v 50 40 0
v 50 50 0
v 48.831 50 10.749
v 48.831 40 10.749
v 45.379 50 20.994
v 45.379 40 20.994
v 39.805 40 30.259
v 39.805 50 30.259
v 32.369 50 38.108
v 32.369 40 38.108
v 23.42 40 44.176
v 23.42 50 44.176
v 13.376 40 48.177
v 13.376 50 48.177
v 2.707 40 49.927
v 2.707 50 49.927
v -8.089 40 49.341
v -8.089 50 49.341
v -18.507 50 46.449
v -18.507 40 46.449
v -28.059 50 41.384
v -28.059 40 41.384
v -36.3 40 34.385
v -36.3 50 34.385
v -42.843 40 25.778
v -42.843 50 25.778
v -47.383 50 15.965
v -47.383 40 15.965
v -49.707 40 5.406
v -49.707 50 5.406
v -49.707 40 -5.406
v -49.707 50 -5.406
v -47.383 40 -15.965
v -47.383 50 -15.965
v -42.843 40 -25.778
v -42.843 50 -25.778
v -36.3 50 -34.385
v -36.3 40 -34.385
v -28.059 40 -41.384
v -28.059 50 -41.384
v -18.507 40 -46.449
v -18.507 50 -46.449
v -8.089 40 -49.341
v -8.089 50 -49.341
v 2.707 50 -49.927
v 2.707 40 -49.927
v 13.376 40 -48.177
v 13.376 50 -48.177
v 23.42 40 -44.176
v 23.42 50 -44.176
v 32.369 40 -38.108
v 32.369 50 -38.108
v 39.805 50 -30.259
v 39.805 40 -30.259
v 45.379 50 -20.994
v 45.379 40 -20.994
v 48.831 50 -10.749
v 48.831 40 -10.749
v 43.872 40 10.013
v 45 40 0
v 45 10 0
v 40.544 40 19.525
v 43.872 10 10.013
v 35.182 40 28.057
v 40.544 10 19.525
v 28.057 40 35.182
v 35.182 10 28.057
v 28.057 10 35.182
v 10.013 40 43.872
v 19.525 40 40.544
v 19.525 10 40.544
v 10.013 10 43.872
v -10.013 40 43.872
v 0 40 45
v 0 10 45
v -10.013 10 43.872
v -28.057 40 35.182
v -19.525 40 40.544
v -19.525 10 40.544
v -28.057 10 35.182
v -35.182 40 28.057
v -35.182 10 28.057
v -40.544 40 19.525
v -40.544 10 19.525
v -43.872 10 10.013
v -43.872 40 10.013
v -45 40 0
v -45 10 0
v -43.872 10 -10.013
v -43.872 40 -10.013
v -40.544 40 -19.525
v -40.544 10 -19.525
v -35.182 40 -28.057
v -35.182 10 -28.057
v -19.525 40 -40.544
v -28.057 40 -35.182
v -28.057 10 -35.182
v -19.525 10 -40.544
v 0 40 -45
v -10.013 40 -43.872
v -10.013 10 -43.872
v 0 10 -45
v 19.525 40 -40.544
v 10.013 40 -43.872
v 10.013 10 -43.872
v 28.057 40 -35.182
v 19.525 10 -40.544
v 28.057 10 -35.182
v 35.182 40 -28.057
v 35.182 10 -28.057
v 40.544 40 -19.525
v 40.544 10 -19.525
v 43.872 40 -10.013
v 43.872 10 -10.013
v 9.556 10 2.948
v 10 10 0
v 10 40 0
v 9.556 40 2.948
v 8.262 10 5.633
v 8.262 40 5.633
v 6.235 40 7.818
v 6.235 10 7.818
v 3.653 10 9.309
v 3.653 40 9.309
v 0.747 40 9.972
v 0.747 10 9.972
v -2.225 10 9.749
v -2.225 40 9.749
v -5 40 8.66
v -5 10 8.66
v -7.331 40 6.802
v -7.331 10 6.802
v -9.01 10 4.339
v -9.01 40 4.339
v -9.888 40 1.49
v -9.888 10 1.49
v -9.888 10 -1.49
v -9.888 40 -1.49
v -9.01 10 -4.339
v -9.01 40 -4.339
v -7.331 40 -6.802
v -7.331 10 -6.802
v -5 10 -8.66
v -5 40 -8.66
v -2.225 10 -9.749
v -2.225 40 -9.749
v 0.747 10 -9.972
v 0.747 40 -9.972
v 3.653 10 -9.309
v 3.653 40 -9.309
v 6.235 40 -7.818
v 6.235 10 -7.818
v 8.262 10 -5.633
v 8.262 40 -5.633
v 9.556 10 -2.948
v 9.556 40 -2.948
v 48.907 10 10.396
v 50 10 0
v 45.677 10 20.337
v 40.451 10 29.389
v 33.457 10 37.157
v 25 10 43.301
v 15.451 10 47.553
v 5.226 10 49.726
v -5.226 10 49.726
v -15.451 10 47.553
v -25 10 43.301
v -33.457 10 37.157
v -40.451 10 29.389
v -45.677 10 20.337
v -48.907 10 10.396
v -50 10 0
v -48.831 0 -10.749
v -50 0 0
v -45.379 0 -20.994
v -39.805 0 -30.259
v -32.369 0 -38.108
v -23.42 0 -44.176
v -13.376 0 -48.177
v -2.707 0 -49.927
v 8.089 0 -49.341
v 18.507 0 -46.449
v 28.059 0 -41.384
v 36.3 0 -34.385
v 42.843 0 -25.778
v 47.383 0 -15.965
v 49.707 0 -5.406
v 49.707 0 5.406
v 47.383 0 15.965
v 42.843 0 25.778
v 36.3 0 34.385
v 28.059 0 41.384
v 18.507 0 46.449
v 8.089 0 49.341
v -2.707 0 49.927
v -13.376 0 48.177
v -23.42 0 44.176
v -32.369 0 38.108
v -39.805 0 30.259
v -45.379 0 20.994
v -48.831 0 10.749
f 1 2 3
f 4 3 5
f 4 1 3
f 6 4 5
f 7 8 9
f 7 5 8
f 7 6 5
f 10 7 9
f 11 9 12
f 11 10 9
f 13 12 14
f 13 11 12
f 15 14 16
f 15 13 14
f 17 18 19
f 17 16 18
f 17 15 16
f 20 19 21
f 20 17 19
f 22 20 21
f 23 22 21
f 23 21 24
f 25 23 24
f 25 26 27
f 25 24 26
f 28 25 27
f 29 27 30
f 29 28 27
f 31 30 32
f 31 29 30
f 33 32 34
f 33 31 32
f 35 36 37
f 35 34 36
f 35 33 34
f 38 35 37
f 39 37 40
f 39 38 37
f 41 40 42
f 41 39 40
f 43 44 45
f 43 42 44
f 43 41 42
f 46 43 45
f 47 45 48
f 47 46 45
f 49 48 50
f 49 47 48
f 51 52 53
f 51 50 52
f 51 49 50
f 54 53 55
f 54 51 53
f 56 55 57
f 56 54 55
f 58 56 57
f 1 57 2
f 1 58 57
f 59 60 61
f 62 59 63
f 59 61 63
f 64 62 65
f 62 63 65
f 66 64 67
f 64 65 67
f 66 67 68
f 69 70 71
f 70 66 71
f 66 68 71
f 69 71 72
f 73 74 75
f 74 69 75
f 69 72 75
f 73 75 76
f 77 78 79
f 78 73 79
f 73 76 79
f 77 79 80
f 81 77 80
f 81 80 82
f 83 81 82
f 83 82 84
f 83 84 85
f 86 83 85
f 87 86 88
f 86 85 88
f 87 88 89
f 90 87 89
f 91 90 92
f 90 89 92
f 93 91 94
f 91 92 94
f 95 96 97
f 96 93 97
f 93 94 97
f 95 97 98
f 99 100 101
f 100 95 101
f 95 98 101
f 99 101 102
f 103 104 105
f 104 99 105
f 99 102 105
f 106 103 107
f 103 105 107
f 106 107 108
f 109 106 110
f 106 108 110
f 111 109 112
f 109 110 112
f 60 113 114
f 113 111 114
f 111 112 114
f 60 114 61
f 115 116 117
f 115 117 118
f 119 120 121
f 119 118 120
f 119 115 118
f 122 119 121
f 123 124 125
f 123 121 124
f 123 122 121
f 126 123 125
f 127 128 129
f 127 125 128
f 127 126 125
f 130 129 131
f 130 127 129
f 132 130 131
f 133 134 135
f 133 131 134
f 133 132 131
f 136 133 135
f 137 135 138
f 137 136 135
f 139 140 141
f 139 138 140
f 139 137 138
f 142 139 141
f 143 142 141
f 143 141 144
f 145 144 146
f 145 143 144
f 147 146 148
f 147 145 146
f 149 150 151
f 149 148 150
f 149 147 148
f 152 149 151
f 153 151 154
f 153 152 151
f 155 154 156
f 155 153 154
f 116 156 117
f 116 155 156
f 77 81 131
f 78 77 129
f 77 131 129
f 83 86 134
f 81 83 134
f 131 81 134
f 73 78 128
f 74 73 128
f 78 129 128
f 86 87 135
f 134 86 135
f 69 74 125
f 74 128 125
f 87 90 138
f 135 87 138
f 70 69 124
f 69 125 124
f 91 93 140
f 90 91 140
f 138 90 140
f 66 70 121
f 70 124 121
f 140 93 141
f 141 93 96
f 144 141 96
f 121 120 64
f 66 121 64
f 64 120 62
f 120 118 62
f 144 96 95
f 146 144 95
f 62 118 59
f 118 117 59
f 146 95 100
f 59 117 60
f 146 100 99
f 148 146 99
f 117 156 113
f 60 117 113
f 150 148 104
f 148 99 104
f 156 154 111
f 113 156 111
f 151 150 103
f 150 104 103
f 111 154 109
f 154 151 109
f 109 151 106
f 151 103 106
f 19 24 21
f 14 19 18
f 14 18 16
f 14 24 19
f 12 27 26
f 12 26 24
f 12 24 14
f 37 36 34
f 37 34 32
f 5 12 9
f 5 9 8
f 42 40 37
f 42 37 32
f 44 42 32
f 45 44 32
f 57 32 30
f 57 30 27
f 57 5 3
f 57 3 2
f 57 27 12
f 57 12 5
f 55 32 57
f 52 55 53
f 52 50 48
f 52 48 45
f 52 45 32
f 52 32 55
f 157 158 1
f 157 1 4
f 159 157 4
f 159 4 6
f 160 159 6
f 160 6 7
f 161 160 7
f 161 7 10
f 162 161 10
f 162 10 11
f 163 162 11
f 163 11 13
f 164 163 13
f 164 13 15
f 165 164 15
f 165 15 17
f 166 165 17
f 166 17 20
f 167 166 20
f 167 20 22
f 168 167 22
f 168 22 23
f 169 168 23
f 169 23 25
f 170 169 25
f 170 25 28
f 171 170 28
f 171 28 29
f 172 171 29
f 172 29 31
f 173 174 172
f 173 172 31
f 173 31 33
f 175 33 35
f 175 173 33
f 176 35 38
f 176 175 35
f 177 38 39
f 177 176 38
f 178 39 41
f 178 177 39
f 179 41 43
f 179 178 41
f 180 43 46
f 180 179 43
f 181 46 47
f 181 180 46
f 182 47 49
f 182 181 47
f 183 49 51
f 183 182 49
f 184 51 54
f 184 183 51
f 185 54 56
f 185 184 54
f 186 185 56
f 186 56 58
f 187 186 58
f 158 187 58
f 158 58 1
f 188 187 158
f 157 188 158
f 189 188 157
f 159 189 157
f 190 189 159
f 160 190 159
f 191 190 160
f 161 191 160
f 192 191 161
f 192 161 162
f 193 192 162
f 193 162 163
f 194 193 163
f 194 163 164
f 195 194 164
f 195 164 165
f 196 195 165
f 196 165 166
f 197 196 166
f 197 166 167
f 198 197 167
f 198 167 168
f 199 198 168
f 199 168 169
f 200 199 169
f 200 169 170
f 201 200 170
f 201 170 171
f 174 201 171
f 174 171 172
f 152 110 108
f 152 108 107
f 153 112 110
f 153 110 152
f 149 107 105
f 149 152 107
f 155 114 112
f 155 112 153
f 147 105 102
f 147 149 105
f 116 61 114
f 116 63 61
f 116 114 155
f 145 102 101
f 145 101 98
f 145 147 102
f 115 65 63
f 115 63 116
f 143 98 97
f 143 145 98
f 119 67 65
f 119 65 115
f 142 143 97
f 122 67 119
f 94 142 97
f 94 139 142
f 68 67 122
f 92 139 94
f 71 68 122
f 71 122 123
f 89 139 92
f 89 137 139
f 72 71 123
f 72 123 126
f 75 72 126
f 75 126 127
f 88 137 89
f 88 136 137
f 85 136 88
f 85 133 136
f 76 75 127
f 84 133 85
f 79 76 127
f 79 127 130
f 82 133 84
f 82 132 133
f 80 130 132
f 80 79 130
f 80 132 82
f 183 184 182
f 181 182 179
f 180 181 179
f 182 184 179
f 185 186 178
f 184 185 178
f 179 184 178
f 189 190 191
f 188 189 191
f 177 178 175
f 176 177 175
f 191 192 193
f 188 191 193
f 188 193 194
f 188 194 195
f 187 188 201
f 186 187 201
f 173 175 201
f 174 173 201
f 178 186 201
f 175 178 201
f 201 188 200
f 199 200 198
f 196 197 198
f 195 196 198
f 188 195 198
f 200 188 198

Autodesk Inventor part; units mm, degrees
ref_plane "YZ Plane" through (0, 0, 0) normal (1, 0, 0) x (0, 1, 0)
ref_plane "XZ Plane" through (0, 0, 0) normal (0, 1, 0) x (-1, 0, 0)
ref_plane "XY Plane" through (0, 0, 0) normal (0, 0, 1) x (1, 0, 0)
sketch "Sketch1" plane through (0, 0, 0) normal (0, 1, 0) x (-1, 0, 0)
  point P0 (0, 0)
sketch "Sketch2" plane through (0, 0, 0) normal (0, 1, 0) x (-1, 0, 0)
  circle A0 centre (0, 0) radius 50
  dimension "d0" = 100
extrude "Extrusion1" add sketch "Sketch2" along normal blind 10
sketch "Sketch3" plane through (0, 10, 0) normal (0, 1, 0) x (1, 0, 0)
  circle A0 centre (0, 0) radius 50
  circle A1 centre (0, 0) radius 45
  circle A2 centre (0, 0) radius 10
  dimension "d3" = 90
  dimension "d4" = 20
extrude "Extrusion2" add sketch "Sketch3" along normal blind 30
sketch "Sketch4" plane through (0, 40, 0) normal (0, 1, 0) x (1, 0, 0)
  circle A0 centre (0, 0) radius 50
extrude "Extrusion3" add sketch "Sketch4" along normal blind 10
properties part number "cyl2_10cm_5cm"
